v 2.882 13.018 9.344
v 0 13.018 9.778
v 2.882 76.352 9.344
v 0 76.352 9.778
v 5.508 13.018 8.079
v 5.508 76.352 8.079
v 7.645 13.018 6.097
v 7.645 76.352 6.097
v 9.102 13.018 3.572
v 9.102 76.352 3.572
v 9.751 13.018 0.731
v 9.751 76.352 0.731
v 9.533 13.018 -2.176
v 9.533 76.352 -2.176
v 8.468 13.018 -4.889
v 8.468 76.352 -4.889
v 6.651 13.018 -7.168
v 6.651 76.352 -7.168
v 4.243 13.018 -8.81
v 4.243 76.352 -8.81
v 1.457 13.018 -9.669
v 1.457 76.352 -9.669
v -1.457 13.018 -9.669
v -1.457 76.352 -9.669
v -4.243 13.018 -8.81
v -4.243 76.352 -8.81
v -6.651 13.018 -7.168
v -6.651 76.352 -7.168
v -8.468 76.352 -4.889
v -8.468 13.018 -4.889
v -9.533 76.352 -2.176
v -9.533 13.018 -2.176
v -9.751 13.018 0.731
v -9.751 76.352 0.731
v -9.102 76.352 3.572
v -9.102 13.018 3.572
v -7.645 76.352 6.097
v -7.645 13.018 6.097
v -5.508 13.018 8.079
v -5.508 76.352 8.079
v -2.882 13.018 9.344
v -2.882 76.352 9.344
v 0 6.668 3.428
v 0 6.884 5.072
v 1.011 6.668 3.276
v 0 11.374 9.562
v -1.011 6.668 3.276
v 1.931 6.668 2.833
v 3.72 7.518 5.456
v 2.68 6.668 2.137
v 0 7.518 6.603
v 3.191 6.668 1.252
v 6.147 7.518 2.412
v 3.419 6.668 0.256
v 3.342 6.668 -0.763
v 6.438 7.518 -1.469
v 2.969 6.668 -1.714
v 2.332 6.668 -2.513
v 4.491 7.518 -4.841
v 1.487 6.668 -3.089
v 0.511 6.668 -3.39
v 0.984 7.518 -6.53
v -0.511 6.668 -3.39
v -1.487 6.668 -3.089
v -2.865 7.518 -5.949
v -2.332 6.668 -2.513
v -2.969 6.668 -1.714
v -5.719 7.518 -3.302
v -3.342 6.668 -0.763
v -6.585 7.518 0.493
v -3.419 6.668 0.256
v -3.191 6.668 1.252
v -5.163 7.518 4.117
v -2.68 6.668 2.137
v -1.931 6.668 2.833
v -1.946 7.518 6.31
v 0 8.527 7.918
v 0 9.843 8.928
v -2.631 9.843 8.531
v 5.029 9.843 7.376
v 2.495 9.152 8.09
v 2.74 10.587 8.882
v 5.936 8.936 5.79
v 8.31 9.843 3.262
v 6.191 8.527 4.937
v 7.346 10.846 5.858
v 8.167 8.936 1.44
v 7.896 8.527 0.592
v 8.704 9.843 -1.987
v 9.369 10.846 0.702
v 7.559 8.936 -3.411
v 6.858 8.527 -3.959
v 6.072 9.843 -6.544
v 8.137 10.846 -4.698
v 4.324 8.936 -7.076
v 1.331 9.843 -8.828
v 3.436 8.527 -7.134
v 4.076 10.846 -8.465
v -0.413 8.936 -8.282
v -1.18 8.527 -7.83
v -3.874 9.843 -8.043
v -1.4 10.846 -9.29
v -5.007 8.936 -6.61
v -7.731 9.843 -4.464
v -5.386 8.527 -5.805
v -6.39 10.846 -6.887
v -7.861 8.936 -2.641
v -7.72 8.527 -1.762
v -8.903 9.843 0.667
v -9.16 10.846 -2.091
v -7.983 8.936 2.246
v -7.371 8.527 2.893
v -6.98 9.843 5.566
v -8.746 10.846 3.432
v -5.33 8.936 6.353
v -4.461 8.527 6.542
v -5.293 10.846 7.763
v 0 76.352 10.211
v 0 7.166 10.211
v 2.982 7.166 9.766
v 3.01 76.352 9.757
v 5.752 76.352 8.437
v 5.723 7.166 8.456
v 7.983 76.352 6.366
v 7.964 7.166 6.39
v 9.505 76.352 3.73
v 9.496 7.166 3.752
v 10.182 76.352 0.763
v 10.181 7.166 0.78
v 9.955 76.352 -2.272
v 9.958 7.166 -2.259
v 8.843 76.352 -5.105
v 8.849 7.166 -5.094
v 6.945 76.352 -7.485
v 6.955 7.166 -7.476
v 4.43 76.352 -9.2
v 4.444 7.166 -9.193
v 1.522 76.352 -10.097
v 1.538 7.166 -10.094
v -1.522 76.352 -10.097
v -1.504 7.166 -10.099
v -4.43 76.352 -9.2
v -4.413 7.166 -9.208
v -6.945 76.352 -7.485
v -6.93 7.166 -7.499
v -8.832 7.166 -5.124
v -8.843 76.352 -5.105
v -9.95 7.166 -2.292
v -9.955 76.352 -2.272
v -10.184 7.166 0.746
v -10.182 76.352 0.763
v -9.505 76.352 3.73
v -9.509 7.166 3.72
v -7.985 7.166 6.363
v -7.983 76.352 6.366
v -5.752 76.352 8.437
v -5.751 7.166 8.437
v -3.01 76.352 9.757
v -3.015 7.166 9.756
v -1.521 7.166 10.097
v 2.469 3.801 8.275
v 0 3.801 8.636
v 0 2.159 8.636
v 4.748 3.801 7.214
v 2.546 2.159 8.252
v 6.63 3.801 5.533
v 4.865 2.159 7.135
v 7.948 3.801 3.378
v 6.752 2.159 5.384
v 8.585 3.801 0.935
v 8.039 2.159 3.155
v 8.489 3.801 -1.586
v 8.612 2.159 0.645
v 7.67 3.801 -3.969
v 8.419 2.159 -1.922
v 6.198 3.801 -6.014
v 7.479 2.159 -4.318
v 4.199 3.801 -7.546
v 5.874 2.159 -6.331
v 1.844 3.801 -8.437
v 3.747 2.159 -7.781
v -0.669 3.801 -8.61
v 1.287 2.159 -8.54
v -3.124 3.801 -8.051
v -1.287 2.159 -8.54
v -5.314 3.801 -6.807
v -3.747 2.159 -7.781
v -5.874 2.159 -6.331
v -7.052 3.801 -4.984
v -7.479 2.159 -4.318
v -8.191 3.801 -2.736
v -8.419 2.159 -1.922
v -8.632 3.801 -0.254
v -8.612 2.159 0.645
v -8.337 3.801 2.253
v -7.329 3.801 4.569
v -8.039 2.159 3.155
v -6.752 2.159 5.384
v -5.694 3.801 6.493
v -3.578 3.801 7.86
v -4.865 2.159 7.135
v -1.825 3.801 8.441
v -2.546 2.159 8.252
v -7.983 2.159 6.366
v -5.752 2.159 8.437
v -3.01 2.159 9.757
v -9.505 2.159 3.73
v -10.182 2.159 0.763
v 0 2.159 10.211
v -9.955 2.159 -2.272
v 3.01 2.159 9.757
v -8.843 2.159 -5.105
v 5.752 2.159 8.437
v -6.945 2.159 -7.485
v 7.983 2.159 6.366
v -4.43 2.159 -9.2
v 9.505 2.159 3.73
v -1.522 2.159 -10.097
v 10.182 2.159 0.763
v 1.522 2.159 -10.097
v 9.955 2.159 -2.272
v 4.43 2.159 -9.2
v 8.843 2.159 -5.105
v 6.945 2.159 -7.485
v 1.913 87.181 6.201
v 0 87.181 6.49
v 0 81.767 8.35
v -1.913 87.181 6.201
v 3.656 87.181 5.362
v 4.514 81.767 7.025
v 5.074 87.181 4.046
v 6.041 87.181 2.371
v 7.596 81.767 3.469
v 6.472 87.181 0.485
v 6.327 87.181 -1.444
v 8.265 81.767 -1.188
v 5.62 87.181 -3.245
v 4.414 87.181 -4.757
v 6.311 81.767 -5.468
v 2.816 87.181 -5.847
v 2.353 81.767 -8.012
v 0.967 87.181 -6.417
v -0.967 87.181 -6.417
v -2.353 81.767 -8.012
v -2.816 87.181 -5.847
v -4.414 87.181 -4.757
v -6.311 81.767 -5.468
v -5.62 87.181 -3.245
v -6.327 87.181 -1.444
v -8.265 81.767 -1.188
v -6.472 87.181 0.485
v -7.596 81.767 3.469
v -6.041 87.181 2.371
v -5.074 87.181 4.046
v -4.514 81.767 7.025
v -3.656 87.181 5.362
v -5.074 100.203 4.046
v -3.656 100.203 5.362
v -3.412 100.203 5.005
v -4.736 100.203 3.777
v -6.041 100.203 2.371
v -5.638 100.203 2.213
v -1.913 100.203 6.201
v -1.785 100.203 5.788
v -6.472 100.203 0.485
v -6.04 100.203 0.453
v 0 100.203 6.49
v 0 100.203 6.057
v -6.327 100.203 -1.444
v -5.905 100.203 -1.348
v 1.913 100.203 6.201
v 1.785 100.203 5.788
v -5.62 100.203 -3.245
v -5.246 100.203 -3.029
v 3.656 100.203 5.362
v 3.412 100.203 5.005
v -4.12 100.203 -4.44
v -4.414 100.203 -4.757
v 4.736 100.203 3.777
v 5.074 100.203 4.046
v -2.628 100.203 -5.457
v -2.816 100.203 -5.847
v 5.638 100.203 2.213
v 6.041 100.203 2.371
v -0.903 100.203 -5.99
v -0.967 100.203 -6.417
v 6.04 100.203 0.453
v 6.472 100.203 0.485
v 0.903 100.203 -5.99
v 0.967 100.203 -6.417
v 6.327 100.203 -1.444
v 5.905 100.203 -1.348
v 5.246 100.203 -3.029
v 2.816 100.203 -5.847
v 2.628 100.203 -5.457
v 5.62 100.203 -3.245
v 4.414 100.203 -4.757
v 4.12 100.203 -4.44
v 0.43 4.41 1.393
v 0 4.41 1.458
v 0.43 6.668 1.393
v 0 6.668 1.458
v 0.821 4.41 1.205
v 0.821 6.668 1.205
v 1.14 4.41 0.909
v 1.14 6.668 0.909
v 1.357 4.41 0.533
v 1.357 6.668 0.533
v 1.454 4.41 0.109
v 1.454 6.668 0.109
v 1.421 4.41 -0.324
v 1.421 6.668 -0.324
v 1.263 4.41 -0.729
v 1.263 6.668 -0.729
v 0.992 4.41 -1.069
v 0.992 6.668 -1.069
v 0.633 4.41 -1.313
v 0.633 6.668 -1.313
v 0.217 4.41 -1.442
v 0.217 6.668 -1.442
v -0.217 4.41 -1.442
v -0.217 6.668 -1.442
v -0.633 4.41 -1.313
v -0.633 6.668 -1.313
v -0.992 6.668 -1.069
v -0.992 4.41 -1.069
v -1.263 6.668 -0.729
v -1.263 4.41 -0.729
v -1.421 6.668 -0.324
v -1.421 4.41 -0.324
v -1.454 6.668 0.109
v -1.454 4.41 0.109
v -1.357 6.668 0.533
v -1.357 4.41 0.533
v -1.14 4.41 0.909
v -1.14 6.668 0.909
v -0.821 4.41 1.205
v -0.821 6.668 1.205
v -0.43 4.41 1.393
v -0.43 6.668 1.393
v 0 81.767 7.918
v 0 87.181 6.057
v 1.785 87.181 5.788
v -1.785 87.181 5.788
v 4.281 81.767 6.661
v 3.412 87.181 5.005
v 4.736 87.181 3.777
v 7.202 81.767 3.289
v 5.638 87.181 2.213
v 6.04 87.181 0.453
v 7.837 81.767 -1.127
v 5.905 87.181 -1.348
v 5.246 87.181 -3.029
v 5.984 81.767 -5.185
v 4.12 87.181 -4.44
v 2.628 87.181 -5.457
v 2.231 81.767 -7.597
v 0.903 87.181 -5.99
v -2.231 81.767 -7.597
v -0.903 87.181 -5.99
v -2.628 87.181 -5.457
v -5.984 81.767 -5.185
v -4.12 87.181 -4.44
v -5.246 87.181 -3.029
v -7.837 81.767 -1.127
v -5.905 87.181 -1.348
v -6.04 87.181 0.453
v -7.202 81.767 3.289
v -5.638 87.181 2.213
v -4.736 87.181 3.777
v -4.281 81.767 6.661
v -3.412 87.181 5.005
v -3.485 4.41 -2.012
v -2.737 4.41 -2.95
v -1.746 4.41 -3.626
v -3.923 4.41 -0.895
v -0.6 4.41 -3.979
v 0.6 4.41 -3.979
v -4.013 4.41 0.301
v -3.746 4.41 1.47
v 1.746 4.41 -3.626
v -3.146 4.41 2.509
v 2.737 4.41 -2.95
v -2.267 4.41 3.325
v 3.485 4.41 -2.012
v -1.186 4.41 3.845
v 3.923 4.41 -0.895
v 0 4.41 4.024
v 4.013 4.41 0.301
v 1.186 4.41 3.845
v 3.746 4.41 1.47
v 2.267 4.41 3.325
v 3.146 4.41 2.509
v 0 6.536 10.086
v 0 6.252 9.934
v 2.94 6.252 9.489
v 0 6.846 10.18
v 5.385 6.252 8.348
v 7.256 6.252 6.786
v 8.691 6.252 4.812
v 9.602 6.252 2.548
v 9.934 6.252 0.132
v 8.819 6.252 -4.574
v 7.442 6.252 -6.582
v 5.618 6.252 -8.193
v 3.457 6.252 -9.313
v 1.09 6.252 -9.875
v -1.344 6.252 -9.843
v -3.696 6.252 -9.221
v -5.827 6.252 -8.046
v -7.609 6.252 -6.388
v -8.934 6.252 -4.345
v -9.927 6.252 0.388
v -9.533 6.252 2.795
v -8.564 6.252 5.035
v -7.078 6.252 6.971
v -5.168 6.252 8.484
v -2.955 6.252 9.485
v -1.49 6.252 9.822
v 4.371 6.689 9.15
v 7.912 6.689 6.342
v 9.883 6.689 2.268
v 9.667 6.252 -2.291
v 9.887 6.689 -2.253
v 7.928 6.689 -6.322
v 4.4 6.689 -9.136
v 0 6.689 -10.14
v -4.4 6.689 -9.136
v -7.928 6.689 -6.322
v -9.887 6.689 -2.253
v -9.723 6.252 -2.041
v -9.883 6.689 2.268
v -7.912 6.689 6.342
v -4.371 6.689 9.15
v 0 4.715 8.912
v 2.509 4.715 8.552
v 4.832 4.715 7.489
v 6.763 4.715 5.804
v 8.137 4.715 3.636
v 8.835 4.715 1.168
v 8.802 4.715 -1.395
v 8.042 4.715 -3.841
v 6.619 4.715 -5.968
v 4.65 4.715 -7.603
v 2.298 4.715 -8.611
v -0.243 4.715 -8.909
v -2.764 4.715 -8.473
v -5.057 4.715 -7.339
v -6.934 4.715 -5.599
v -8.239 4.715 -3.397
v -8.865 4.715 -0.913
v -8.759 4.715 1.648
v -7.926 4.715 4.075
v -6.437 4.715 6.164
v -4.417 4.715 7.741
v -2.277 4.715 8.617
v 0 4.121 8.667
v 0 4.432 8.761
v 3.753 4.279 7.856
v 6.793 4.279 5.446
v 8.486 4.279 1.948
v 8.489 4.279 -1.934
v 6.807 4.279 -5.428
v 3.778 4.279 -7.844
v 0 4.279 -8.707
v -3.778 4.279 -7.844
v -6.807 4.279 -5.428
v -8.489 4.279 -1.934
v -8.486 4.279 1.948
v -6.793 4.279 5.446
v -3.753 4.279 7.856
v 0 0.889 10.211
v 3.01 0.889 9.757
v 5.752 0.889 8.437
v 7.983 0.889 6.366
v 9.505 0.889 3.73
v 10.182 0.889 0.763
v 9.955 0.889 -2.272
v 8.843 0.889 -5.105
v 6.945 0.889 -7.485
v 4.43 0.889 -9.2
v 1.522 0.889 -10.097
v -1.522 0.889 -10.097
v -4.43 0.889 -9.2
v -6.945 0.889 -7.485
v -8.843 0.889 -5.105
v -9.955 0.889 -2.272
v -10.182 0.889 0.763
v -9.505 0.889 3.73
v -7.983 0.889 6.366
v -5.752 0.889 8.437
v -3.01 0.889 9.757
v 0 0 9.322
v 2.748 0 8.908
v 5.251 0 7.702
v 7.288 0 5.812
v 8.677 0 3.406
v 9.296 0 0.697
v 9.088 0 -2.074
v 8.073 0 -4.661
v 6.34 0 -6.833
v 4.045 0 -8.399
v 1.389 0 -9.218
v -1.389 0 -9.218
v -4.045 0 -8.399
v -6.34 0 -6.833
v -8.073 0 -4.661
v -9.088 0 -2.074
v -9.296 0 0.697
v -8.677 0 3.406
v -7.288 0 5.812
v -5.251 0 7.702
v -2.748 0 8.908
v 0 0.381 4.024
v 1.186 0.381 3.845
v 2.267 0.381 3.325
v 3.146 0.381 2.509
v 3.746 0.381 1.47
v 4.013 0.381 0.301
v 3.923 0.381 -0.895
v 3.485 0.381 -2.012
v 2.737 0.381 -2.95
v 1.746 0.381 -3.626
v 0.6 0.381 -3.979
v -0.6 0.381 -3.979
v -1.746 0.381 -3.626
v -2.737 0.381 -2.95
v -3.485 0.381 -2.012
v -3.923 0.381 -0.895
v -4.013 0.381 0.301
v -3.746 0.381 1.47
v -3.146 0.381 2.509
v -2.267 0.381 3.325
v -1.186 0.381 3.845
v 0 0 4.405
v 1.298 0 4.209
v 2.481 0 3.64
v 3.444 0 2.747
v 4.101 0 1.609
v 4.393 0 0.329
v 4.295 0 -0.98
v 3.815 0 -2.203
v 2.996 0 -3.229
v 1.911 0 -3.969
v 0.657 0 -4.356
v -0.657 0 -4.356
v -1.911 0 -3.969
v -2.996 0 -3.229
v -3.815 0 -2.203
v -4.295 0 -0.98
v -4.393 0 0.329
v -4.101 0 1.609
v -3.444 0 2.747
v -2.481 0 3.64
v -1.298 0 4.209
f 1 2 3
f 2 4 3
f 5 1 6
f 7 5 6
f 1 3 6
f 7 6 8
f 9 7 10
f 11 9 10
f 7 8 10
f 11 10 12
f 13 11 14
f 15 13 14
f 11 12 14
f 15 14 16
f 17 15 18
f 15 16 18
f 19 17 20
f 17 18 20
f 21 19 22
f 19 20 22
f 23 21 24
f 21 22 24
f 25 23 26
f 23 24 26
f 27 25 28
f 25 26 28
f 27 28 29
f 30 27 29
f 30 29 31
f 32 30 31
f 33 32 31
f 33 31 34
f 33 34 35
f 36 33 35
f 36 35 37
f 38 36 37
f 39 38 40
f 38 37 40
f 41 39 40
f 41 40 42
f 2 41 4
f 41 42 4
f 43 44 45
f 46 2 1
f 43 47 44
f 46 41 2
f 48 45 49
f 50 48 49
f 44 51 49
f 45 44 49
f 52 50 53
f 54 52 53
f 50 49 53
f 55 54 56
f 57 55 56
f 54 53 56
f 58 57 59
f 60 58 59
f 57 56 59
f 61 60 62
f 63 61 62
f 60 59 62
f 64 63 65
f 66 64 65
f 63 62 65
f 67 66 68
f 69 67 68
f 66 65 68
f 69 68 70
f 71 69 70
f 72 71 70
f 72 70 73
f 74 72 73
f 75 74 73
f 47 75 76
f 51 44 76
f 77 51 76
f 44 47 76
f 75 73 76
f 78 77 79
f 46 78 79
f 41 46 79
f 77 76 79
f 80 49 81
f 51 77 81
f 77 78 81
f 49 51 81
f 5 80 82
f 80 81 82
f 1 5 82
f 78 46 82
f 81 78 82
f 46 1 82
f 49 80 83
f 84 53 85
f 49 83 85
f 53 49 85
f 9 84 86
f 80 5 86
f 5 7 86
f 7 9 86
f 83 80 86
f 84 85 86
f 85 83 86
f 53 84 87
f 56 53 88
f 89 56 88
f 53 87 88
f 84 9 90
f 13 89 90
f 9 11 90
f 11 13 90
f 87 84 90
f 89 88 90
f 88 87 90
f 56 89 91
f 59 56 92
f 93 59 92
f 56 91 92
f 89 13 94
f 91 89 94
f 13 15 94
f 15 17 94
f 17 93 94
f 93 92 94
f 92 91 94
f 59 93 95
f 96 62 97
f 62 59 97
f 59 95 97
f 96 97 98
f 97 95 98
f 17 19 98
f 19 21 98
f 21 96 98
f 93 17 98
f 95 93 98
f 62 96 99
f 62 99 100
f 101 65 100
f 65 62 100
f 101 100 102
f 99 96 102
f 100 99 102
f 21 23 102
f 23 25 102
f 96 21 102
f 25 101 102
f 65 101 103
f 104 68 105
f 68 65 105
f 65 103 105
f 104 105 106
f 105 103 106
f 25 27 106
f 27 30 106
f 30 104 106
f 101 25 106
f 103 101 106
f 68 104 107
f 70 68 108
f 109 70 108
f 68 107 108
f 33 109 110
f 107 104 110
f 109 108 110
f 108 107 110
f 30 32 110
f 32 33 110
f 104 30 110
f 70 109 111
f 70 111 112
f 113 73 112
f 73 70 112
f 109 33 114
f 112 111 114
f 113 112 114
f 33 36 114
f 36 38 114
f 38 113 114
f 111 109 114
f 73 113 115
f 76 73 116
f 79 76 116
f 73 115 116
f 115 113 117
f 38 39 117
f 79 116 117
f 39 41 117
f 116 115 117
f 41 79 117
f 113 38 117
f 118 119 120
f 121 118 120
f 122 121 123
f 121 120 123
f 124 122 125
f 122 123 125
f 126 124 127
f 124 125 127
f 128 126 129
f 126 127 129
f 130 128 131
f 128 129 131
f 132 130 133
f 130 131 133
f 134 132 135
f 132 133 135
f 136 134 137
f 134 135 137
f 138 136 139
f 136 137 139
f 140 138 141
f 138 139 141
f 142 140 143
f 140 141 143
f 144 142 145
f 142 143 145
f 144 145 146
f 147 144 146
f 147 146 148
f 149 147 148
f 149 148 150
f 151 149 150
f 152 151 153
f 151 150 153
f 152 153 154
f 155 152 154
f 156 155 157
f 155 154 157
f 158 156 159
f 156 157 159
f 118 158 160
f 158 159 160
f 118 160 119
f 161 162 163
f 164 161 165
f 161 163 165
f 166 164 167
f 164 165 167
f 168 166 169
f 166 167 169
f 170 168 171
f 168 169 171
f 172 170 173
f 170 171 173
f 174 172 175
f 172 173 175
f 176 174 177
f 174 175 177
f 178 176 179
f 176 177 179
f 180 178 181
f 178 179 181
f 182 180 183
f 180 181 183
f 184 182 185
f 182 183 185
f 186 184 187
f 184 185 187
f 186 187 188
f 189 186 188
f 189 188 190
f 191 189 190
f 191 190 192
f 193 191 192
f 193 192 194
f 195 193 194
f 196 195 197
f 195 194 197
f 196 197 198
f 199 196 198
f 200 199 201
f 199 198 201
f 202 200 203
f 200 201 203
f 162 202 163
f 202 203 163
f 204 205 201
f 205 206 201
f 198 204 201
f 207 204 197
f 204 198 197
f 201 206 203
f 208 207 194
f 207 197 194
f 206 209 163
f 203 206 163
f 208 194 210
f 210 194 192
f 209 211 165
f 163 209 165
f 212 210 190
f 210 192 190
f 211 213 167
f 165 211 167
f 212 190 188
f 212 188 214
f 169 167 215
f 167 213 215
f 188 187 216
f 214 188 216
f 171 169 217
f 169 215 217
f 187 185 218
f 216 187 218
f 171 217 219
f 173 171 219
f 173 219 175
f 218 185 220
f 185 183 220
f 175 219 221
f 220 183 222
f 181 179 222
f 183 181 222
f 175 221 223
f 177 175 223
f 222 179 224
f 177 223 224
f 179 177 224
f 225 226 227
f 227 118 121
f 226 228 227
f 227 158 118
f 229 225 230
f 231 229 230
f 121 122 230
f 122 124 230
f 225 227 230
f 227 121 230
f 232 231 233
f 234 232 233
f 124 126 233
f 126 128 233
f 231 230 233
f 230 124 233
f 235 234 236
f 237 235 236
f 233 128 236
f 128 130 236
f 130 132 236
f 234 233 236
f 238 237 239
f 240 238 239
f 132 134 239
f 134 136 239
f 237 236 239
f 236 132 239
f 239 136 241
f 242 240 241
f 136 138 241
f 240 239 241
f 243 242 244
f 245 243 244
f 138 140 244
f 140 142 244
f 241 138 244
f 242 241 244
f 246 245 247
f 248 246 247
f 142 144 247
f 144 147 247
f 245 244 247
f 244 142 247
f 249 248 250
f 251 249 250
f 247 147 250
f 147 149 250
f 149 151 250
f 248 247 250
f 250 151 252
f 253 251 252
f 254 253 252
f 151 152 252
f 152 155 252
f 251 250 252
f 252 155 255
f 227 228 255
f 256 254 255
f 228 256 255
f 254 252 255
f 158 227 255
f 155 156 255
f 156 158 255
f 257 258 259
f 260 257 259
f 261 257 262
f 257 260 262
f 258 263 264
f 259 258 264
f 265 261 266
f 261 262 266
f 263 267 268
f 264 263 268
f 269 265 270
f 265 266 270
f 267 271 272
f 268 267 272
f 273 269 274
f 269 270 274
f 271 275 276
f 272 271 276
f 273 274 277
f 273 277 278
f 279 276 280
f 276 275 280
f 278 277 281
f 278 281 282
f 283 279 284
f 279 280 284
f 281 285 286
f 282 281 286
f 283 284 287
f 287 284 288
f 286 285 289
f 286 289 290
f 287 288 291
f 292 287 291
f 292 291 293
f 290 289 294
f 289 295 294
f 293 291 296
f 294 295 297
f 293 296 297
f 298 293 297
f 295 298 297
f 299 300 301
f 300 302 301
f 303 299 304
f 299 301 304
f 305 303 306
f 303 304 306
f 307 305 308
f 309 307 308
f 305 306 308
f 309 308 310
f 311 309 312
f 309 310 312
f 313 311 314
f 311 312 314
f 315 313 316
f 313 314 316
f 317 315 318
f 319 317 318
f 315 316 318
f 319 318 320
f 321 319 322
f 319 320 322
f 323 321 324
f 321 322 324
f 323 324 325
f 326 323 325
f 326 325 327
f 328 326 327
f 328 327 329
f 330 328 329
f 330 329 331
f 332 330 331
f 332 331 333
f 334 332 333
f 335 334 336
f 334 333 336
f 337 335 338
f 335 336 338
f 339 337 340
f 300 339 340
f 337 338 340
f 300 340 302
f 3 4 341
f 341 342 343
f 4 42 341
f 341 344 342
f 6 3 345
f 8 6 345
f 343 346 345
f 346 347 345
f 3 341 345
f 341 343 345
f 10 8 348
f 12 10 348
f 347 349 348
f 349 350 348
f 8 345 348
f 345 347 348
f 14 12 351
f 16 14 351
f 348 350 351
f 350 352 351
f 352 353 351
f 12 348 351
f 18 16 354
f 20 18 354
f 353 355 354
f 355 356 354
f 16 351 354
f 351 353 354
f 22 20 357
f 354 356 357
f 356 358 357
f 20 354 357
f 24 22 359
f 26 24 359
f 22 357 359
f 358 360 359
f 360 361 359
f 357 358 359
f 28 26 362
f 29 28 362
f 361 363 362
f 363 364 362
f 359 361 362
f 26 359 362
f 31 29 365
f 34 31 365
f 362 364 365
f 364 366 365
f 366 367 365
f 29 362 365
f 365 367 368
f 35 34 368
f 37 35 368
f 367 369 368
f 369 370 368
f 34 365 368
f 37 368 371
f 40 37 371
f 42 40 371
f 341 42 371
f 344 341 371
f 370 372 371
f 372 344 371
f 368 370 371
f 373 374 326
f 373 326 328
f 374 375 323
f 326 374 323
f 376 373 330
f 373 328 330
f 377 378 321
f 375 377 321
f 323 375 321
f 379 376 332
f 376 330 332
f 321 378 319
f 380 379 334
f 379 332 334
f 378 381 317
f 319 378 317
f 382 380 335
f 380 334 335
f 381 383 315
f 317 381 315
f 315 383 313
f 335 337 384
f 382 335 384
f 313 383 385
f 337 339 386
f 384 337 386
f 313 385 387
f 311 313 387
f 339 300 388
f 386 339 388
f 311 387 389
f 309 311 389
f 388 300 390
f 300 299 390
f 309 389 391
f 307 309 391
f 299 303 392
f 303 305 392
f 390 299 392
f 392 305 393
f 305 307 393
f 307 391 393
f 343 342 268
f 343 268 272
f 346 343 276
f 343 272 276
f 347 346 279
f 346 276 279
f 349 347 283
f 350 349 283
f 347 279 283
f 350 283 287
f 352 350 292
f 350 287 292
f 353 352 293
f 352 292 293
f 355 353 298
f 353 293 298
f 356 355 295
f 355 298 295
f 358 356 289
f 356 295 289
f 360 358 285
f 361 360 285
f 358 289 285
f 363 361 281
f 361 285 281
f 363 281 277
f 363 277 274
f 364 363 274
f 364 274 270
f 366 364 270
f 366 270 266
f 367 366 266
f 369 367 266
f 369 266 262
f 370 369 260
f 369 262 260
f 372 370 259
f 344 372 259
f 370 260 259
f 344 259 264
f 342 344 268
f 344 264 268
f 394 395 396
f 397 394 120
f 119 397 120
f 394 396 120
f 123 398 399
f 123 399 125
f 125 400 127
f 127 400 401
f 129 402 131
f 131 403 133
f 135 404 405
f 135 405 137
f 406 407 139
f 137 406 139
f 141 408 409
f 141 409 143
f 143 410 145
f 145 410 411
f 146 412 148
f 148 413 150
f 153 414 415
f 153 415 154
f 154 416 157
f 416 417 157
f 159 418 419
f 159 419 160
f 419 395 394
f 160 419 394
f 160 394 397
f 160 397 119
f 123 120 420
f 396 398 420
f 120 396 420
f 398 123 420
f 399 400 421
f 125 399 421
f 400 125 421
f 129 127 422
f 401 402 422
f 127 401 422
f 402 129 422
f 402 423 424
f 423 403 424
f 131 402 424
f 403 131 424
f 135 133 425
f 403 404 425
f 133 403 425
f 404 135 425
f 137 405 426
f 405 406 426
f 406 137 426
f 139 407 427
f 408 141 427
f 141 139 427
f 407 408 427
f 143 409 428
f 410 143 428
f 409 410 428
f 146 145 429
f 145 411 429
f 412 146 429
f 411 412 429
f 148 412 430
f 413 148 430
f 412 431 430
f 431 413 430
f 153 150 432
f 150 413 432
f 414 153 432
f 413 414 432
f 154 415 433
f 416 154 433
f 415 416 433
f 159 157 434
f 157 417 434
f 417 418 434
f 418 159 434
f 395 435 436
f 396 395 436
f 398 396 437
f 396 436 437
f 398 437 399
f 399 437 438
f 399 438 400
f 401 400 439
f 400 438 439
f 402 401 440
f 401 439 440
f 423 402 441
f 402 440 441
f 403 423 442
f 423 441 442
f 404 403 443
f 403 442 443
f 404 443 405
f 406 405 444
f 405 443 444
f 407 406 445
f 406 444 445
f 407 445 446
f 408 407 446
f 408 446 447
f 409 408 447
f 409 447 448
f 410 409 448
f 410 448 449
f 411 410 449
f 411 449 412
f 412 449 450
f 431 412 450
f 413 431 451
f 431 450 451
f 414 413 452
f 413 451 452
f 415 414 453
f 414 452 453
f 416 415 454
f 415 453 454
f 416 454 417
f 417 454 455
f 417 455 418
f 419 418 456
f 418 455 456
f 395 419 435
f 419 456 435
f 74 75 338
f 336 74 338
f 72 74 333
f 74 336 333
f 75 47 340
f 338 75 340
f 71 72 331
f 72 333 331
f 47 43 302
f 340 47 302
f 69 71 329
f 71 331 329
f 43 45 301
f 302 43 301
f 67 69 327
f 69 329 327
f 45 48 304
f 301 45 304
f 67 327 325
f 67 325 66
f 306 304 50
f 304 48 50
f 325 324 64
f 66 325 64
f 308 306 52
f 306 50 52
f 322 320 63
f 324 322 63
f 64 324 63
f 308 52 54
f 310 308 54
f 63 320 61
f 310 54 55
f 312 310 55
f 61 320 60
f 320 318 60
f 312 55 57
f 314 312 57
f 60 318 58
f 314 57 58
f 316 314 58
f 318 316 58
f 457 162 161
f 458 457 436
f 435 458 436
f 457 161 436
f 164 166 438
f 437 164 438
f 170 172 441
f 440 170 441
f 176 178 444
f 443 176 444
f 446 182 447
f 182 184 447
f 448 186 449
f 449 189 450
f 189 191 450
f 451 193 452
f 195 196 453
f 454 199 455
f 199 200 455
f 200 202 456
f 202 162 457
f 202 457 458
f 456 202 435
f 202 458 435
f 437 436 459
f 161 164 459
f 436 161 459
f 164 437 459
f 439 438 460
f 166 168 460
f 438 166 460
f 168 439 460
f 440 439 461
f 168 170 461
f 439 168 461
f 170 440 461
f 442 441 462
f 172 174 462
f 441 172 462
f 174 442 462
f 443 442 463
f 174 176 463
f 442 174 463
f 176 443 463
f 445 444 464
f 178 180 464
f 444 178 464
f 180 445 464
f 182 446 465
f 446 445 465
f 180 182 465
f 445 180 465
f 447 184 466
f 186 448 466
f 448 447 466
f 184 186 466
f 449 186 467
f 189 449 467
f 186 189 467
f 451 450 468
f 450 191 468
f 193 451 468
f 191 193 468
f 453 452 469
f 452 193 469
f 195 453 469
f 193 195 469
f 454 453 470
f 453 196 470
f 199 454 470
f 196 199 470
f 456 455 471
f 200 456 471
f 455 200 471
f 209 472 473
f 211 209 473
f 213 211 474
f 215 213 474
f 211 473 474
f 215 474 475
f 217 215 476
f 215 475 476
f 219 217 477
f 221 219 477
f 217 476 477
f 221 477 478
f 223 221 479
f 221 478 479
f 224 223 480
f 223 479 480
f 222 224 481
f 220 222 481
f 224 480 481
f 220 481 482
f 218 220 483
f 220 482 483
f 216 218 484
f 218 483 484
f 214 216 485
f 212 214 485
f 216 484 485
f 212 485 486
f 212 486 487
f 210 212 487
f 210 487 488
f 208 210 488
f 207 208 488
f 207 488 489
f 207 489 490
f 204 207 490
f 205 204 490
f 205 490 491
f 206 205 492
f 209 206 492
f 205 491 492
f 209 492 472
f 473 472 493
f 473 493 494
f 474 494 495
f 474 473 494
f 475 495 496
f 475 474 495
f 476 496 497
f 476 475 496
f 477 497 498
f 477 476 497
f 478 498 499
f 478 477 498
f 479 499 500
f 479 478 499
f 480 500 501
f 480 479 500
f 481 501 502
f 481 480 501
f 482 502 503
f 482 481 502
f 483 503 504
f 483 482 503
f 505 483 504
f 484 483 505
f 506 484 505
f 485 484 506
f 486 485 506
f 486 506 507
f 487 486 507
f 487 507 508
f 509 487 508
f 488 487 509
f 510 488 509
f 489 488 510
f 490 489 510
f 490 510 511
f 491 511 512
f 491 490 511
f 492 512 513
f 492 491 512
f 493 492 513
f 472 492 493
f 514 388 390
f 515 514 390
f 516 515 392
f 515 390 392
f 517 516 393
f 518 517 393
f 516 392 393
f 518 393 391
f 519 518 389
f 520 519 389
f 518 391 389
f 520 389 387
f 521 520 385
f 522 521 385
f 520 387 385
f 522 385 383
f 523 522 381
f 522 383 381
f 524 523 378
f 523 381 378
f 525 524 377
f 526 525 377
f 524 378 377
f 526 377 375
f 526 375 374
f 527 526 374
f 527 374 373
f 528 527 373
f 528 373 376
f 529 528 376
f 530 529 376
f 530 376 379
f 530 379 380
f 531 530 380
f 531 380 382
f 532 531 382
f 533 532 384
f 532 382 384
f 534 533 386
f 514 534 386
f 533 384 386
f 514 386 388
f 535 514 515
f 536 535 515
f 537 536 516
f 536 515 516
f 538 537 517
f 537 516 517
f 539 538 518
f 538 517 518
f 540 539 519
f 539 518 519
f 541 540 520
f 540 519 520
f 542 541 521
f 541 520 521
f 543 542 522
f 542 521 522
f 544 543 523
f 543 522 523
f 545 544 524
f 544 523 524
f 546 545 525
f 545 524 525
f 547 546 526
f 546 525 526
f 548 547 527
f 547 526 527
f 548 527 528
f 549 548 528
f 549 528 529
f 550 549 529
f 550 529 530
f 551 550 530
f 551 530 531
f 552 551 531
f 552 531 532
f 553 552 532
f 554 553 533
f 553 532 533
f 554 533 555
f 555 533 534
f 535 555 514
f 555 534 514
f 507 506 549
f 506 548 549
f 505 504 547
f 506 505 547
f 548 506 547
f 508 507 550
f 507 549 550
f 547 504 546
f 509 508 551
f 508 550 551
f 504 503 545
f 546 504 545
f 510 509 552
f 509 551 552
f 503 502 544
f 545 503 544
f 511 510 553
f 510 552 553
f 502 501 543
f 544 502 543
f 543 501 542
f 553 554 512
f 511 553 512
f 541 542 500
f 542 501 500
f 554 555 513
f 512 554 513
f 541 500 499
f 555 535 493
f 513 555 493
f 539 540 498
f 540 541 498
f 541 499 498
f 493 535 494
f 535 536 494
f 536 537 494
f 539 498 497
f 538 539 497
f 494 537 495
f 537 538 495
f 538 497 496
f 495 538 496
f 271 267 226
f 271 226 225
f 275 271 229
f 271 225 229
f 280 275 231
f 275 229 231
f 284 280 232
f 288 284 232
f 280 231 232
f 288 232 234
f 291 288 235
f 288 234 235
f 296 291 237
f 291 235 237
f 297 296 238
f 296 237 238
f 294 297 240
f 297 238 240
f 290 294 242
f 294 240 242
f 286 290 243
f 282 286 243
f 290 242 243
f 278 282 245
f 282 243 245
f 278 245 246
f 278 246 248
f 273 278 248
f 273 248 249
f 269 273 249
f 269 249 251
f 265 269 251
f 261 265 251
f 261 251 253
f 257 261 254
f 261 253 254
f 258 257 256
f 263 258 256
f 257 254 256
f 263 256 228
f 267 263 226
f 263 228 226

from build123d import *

# Parameters (mm, degrees)
F2_SIZE = 0.889
F3_SIZE = 0.381
F4_R    = 1.651


with BuildPart() as f1:
    # F0 (on Right) → F1 (revolve)
    with BuildSketch(Plane.YZ):
        with BuildLine():
            Line((0, 10.2108), (0, 4.024108))
            Line((0, 4.024108), (4.410164, 4.024108))
            Line((4.410164, 4.024108), (4.410164, 1.457856))
            Line((4.410164, 1.457856), (6.667502, 1.457856))
            Line((6.667502, 1.457856), (6.667502, 3.428277))
            ThreePointArc((6.667502, 3.428277), (8.527374, 7.918405), (13.017502, 9.778277))
            Line((13.017502, 9.778277), (76.3524, 9.778277))
            Line((76.3524, 9.778277), (87.180994, 6.057177))
            Line((87.180994, 6.057177), (100.203, 6.057177))
            Line((100.203, 6.057177), (100.203, 6.4897))
            Line((100.203, 6.4897), (87.180994, 6.4897))
            Line((87.180994, 6.4897), (76.3524, 10.2108))
            Line((76.3524, 10.2108), (6.667502, 10.2108))
            Line((6.667502, 10.2108), (4.299904, 8.636))
            Line((4.299904, 8.636), (2.159, 8.636))
            Line((2.159, 8.636), (2.159, 10.2108))
            Line((2.159, 10.2108), (0, 10.2108))
        make_face()
    revolve(axis=Axis((0, 1.0795, 0), (0, 1, 0)))

    # F2
    f2_edges = [f1.edges().sort_by_distance(p)[0] for p in [
        (0, 0, -10.2108),
    ]]
    chamfer(f2_edges, length=F2_SIZE)

    # F3
    f3_edges = [f1.edges().sort_by_distance(p)[0] for p in [
        (0, 0, -4.024108),
    ]]
    chamfer(f3_edges, length=F3_SIZE)

    # F4
    f4_edges = [f1.edges().sort_by_distance(p)[0] for p in [
        (0, 6.667502, -10.2108),
        (0, 4.299904, -8.636),
    ]]
    fillet(f4_edges, radius=F4_R)


solid = f1.part
